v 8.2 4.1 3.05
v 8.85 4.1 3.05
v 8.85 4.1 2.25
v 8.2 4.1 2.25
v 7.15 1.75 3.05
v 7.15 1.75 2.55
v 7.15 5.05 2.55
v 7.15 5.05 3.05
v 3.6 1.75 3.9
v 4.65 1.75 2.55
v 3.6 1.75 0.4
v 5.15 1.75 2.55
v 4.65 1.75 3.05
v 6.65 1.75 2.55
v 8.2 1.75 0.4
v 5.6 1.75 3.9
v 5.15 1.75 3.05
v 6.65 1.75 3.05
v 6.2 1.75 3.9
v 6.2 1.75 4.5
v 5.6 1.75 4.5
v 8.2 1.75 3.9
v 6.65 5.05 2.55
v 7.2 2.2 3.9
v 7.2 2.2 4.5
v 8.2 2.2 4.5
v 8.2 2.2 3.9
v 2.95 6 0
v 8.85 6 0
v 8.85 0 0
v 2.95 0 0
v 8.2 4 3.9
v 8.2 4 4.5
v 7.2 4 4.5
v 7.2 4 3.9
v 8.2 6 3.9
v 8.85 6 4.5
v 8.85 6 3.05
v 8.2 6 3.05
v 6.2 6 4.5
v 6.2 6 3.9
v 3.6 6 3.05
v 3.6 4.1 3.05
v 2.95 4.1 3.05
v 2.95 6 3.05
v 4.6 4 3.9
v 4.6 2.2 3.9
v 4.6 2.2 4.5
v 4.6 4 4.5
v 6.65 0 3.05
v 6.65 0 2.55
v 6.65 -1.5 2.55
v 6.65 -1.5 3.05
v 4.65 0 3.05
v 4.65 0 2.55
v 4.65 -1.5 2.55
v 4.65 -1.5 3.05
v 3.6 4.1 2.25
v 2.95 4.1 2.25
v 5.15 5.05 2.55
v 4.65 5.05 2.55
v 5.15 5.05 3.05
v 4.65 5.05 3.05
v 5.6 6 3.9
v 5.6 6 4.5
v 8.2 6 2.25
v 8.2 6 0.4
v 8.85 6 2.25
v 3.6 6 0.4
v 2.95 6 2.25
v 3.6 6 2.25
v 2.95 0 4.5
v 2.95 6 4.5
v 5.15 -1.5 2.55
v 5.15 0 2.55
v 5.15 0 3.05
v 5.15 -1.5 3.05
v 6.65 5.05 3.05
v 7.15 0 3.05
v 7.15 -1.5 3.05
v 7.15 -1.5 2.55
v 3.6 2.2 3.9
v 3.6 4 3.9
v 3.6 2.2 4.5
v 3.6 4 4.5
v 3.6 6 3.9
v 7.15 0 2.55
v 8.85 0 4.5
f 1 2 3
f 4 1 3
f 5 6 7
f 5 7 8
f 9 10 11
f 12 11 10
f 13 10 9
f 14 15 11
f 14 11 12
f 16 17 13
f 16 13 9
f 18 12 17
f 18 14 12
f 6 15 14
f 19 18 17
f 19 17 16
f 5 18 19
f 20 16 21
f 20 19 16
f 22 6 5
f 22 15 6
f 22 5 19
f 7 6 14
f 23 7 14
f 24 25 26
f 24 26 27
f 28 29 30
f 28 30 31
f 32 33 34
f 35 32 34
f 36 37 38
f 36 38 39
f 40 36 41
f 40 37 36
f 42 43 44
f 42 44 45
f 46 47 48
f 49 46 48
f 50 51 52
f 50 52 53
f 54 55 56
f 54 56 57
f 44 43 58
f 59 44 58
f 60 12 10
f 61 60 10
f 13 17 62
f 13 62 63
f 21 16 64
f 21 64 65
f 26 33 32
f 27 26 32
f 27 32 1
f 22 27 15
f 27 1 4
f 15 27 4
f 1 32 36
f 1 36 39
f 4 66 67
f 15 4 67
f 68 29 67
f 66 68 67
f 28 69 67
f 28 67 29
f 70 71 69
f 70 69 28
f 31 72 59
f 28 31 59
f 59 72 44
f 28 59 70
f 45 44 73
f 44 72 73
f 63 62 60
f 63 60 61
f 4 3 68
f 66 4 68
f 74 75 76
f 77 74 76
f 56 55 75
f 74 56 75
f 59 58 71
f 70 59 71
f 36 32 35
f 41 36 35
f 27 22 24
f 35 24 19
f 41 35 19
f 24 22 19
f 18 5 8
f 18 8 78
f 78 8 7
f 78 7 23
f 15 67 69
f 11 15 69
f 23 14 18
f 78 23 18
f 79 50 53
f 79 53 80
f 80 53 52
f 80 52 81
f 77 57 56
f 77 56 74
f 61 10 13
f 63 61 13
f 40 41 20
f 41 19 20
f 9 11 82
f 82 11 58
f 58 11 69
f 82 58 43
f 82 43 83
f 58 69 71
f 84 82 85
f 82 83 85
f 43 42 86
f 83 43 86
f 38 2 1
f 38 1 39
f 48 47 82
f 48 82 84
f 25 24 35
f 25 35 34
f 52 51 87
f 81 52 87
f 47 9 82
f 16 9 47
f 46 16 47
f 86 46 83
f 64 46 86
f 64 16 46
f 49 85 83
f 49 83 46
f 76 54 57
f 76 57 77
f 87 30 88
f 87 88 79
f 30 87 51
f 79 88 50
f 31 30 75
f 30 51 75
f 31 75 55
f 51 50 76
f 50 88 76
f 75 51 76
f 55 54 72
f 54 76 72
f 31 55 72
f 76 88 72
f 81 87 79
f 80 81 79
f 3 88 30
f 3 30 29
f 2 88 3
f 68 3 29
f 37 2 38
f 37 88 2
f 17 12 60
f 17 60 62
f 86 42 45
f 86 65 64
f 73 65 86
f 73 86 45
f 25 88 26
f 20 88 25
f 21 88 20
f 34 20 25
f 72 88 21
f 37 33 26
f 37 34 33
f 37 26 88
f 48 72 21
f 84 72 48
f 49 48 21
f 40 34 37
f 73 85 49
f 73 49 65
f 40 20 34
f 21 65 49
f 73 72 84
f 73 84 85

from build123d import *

# Parameters (mm, degrees)
SKETCH1_W            = 1.75
SKETCH1_H            = 4.1
BOSS_EXTRUDE1_DEPTH  = 1.6
BOSS_EXTRUDE2_DEPTH  = 2
SKETCH3_W            = 1
SKETCH3_H            = 0.6
BOSS_EXTRUDE3_DEPTH  = 1.8
SKETCH4_W            = 1
SKETCH4_H            = 0.6
BOSS_EXTRUDE4_DEPTH  = 2.25
BOSS_EXTRUDE5_DEPTH  = 1
SKETCH6_W            = 4.1
SKETCH6_H            = 4
BOSS_EXTRUDE6_DEPTH  = 0.65
SKETCH7_W            = 2
SKETCH7_H            = 0.6
BOSS_EXTRUDE7_DEPTH  = 2
SKETCH8_W            = 4.1
SKETCH8_H            = 6
BOSS_EXTRUDE8_DEPTH  = 0.65
SKETCH9_W            = 5.9
SKETCH9_H            = 6
BOSS_EXTRUDE9_DEPTH  = 0.4
SKETCH10_W           = 0.8
SKETCH10_H           = 1.9
CUT_EXTRUDE1_DEPTH   = 1.65
SKETCH11_W           = 0.8
SKETCH11_H           = 1.9
CUT_EXTRUDE2_DEPTH   = 6.9
SKETCH12_W           = 0.5
SKETCH12_H           = 0.5
BOSS_EXTRUDE10_DEPTH = 3.3
SKETCH13_W           = 0.5
SKETCH13_H           = 0.5
BOSS_EXTRUDE11_DEPTH = 3.3
SKETCH14_W           = 0.5
SKETCH14_H           = 0.5
BOSS_EXTRUDE12_DEPTH = 1.5
SKETCH15_W           = 0.5
SKETCH15_H           = 0.5
BOSS_EXTRUDE13_DEPTH = 1.5


with BuildPart() as part:
    # Sketch1 → Boss-Extrude1 (new body)
    with BuildSketch(Plane(origin=(4.6, 0, 0), x_dir=(0, -1, 0), z_dir=(-1, 0, 0))):
        with Locations((-0.875, 2.45)):
            Rectangle(SKETCH1_W, SKETCH1_H)
    extrude(amount=-BOSS_EXTRUDE1_DEPTH)

    # Sketch2 → Boss-Extrude2 (add)
    with BuildSketch(Plane(origin=(6.2, 0, 0), x_dir=(0, 0, -1), z_dir=(1, 0, 0))):
        Polygon((-3.9, 1.75), (-0.4, 1.75), (-0.4, 0), (-4.5, 0), (-4.5, 2.2), (-3.9, 2.2), align=None)
    extrude(amount=BOSS_EXTRUDE2_DEPTH)

    # Sketch3 → Boss-Extrude3 (add)
    with BuildSketch(Plane(origin=(0, 2.2, 0), x_dir=(-1, 0, 0), z_dir=(0, 1, 0))):
        with Locations((-6.7, 4.2)):
            Rectangle(SKETCH3_W, SKETCH3_H)
    extrude(amount=BOSS_EXTRUDE3_DEPTH)

    # Sketch4 → Boss-Extrude4 (add)
    with BuildSketch(Plane(origin=(0, 1.75, 0), x_dir=(-1, 0, 0), z_dir=(0, 1, 0))):
        with Locations((-5.1, 4.2)):
            Rectangle(SKETCH4_W, SKETCH4_H)
    extrude(amount=BOSS_EXTRUDE4_DEPTH)

    # Sketch5 → Boss-Extrude5 (add)
    with BuildSketch(Plane.ZY.offset(-4.6)):
        Polygon((0.4, 0), (0.4, 1.75), (3.9, 1.75), (3.9, 2.2), (4.5, 2.2), (4.5, 0), align=None)
    extrude(amount=BOSS_EXTRUDE5_DEPTH)

    # Sketch6 → Boss-Extrude6 (add)
    with BuildSketch(Plane.ZY.offset(-3.6)):
        with Locations((2.45, 2)):
            Rectangle(SKETCH6_W, SKETCH6_H)
    extrude(amount=BOSS_EXTRUDE6_DEPTH)

    # Sketch7 → Boss-Extrude7 (add)
    with BuildSketch(Plane(origin=(0, 4, 0), x_dir=(-1, 0, 0), z_dir=(0, 1, 0))):
        with Locations((-7.2, 4.2)):
            Rectangle(SKETCH7_W, SKETCH7_H)
        Polygon((-3.6, 0.4), (-3.6, 3.9), (-5.6, 3.9), (-5.6, 4.5), (-2.95, 4.5), (-2.95, 0.4), align=None)
    extrude(amount=BOSS_EXTRUDE7_DEPTH)

    # Sketch8 → Boss-Extrude8 (add)
    with BuildSketch(Plane(origin=(8.2, 0, 0), x_dir=(0, 0, -1), z_dir=(1, 0, 0))):
        with Locations((-2.45, 3)):
            Rectangle(SKETCH8_W, SKETCH8_H)
    extrude(amount=BOSS_EXTRUDE8_DEPTH)

    # Sketch9 → Boss-Extrude9 (add)
    with BuildSketch(Plane(origin=(0, 0, 0.4), x_dir=(-1, 0, 0), z_dir=(0, 0, -1))):
        with Locations((-5.9, 3)):
            Rectangle(SKETCH9_W, SKETCH9_H)
    extrude(amount=BOSS_EXTRUDE9_DEPTH)

    # Sketch10 → Cut-Extrude1 (cut, through all)
    with BuildSketch(Plane(origin=(3.6, 0, 0), x_dir=(0, 0, -1), z_dir=(1, 0, 0))):
        with Locations((-2.65, 5.05)):
            Rectangle(SKETCH10_W, SKETCH10_H)
    extrude(amount=-CUT_EXTRUDE1_DEPTH, mode=Mode.SUBTRACT)

    # Sketch11 → Cut-Extrude2 (cut, through all)
    with BuildSketch(Plane(origin=(8.85, 0, 0), x_dir=(0, 0, -1), z_dir=(1, 0, 0))):
        with Locations((-2.65, 5.05)):
            Rectangle(SKETCH11_W, SKETCH11_H)
    extrude(amount=-CUT_EXTRUDE2_DEPTH, mode=Mode.SUBTRACT)

    # Sketch12 → Boss-Extrude10 (add)
    with BuildSketch(Plane(origin=(0, 1.75, 0), x_dir=(-1, 0, 0), z_dir=(0, 1, 0))):
        with Locations((-4.9, 2.8)):
            Rectangle(SKETCH12_W, SKETCH12_H)
    extrude(amount=BOSS_EXTRUDE10_DEPTH)

    # Sketch13 → Boss-Extrude11 (add)
    with BuildSketch(Plane(origin=(0, 1.75, 0), x_dir=(-1, 0, 0), z_dir=(0, 1, 0))):
        with Locations((-6.9, 2.8)):
            Rectangle(SKETCH13_W, SKETCH13_H)
    extrude(amount=BOSS_EXTRUDE11_DEPTH)

    # Sketch14 → Boss-Extrude12 (add)
    with BuildSketch(Plane.XZ):
        with Locations((4.9, 2.8)):
            Rectangle(SKETCH14_W, SKETCH14_H)
    extrude(amount=BOSS_EXTRUDE12_DEPTH)

    # Sketch15 → Boss-Extrude13 (add)
    with BuildSketch(Plane.XZ):
        with Locations((6.9, 2.8)):
            Rectangle(SKETCH15_W, SKETCH15_H)
    extrude(amount=BOSS_EXTRUDE13_DEPTH)


solid = part.part
